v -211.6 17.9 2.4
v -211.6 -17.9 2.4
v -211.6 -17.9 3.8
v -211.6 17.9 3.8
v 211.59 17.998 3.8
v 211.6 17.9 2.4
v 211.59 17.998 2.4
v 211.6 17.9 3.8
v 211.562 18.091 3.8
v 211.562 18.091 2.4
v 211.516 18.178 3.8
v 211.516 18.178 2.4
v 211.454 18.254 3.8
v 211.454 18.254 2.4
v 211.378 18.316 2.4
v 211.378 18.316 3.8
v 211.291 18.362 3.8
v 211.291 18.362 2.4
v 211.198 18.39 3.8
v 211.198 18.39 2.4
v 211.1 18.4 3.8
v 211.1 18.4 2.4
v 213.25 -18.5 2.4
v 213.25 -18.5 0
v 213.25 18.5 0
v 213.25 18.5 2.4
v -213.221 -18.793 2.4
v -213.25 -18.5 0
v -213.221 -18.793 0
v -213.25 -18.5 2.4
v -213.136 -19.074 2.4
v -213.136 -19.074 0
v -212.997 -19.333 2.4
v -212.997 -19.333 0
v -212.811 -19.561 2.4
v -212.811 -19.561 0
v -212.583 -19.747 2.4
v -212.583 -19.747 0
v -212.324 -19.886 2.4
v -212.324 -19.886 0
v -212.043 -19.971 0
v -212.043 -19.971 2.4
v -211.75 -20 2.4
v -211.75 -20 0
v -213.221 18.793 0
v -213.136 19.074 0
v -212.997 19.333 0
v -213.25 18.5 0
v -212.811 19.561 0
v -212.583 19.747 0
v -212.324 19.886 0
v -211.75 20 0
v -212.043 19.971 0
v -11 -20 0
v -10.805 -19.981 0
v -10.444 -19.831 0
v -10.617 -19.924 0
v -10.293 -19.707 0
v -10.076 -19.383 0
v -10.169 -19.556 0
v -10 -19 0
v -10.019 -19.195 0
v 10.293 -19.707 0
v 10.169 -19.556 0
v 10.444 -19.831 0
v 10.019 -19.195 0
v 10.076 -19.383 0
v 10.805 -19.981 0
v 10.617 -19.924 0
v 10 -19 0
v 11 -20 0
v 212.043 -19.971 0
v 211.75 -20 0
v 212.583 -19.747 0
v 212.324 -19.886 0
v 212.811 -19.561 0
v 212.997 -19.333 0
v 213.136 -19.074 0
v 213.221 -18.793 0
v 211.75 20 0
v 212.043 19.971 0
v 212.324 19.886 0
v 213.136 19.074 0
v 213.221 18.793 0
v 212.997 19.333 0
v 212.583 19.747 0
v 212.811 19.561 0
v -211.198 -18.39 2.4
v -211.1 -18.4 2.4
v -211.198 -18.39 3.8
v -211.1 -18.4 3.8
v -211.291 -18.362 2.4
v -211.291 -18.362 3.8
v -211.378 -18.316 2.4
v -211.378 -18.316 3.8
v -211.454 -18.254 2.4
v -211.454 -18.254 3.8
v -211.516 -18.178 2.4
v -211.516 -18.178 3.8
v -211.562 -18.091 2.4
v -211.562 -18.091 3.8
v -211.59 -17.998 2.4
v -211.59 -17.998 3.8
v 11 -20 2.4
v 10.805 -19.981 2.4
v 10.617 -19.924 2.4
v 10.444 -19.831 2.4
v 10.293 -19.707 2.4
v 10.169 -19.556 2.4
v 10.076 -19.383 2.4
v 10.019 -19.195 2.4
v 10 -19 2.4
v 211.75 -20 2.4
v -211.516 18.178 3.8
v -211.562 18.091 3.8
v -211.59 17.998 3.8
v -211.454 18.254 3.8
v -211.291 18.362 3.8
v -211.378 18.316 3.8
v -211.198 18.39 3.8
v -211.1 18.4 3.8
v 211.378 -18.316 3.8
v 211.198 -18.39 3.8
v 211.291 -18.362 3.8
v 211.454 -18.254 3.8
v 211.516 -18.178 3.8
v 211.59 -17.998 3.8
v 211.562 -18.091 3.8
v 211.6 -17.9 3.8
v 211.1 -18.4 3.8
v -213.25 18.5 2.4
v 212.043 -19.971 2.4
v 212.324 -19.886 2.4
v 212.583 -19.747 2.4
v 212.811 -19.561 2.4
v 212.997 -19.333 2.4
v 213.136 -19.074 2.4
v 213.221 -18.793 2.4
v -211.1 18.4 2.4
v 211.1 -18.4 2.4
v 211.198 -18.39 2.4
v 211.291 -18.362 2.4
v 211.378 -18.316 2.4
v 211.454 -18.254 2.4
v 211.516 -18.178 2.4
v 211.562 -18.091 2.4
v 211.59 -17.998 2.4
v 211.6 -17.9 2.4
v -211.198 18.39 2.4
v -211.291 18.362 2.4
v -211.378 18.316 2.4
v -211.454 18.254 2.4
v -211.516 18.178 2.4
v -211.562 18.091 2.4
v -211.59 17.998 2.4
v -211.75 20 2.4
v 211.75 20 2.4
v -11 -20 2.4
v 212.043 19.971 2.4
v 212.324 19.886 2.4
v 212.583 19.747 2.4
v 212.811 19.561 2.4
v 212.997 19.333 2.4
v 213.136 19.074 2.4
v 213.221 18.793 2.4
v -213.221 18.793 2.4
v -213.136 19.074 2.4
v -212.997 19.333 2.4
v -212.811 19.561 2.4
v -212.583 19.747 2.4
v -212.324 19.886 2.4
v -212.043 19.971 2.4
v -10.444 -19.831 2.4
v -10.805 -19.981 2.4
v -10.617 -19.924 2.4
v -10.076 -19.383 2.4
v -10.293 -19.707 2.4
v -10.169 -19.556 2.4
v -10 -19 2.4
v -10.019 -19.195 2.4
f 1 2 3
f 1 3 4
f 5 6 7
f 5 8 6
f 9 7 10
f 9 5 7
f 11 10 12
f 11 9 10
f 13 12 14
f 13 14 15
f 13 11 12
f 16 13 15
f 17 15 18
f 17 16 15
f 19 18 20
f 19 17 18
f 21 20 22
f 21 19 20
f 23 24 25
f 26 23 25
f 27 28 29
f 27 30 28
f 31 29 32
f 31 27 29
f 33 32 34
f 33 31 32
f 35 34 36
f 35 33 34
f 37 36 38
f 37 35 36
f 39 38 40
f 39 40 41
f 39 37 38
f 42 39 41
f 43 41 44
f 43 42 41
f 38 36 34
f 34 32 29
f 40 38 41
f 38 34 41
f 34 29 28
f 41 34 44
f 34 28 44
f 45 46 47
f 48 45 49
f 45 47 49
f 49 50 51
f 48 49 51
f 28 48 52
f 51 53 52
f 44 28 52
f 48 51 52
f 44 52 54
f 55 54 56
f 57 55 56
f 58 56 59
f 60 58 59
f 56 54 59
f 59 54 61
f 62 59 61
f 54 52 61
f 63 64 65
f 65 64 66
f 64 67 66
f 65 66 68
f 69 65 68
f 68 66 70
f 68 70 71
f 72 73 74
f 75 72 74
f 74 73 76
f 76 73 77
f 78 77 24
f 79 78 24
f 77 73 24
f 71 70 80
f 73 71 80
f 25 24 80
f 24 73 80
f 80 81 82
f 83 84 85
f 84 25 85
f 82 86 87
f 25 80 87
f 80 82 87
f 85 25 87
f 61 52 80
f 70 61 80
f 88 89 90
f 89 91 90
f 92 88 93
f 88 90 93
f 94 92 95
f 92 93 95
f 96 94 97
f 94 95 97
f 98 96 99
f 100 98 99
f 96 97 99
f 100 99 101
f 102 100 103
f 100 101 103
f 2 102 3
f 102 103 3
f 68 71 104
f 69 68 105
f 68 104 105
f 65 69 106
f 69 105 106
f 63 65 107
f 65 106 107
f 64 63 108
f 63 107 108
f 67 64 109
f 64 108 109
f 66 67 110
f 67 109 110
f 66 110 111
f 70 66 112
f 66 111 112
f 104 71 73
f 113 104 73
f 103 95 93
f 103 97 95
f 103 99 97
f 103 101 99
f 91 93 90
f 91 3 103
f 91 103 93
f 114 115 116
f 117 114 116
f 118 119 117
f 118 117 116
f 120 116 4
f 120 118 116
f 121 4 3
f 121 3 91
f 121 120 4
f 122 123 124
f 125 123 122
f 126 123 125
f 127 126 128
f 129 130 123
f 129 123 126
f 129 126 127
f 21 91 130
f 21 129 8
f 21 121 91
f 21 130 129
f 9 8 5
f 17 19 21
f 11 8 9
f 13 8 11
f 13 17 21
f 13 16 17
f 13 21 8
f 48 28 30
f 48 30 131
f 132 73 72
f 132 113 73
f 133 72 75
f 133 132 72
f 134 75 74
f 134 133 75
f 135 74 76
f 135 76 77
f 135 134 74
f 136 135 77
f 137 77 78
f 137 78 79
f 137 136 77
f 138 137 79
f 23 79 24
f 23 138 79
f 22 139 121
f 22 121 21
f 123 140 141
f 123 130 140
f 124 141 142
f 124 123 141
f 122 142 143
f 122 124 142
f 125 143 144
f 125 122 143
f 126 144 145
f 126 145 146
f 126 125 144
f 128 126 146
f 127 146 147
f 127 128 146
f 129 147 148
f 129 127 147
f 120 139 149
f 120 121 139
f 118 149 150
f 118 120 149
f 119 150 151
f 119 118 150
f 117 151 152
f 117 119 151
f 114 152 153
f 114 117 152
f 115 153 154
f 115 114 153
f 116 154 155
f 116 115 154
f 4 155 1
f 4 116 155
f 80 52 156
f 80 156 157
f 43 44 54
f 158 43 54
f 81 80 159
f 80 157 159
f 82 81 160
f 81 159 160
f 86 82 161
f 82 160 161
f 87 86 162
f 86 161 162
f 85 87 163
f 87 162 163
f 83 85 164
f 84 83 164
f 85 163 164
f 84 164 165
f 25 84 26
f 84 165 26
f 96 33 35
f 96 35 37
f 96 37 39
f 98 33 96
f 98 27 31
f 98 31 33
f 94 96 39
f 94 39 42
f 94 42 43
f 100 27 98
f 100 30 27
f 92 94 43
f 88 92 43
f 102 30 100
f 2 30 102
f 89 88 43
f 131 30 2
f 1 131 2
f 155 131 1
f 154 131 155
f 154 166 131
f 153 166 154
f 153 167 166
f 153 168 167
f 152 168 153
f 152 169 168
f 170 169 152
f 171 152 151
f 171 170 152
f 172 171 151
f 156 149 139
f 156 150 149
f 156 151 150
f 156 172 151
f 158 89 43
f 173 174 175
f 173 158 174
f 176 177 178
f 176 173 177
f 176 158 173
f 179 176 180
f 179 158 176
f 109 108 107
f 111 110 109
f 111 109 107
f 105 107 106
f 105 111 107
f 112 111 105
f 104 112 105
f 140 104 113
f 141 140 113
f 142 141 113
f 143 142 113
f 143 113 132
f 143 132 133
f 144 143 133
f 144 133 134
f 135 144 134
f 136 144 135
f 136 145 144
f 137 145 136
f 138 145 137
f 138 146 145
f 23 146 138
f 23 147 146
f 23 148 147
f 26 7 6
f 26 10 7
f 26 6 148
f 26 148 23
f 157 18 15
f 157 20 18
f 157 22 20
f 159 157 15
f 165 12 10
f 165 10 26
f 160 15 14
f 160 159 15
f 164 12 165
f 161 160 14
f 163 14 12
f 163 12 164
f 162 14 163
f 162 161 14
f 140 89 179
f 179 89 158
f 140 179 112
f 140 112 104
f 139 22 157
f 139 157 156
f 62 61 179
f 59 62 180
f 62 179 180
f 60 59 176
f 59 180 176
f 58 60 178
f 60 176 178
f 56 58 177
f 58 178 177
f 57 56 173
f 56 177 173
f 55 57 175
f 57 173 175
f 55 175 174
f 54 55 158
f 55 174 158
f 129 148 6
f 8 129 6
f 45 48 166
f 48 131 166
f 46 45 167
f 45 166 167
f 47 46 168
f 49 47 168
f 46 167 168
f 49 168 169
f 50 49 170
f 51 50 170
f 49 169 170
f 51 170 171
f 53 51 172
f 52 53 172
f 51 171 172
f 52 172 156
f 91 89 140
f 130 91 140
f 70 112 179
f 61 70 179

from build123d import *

# Parameters (mm, degrees)
SKICA1_W                 = 426.5
SKICA1_H                 = 40
P_IDAT_VYSUNUT_M1_DEPTH  = 2.4
SKICA2_W                 = 423.2
SKICA2_H                 = 36.8
P_IDAT_VYSUNUT_M2_DEPTH  = 1.4
ZAOBLIT1_R               = 1.5
ZAOBLIT2_R               = 0.5
ODEBRAT_VYSUNUT_M1_DEPTH = 215.199258869


with BuildPart() as part:
    # Skica1 → Přidat vysunutím1 (new body)
    with BuildSketch(Plane.XY):
        Rectangle(SKICA1_W, SKICA1_H)
    extrude(amount=P_IDAT_VYSUNUT_M1_DEPTH)

    # Skica2 → Přidat vysunutím2 (add)
    with BuildSketch(Plane.XY.offset(2.4)):
        Rectangle(SKICA2_W, SKICA2_H)
    extrude(amount=P_IDAT_VYSUNUT_M2_DEPTH)

    # Zaoblit1
    zaoblit1_edges = [part.edges().sort_by_distance(p)[0] for p in [
        (-213.25, 20, 1.2),
        (213.25, 20, 1.2),
        (213.25, -20, 1.2),
        (-213.25, -20, 1.2),
    ]]
    fillet(zaoblit1_edges, radius=ZAOBLIT1_R)

    # Zaoblit2
    zaoblit2_edges = [part.edges().sort_by_distance(p)[0] for p in [
        (211.6, -18.4, 3.1),
        (211.6, 18.4, 3.1),
        (-211.6, 18.4, 3.1),
        (-211.6, -18.4, 3.1),
    ]]
    fillet(zaoblit2_edges, radius=ZAOBLIT2_R)

    # Skica3 → Odebrat vysunutím1 (cut, through all)
    with BuildSketch(Plane.XY.offset(2.4)):
        with BuildLine():
            Line((0, -19), (-10, -19))
            ThreePointArc((-10, -19), (-10.292893219, -19.707106781), (-11, -20))
            Line((-11, -20), (-11, -20.116946074))
            Line((-11, -20.116946074), (11, -20.116946074))
            Line((11, -20.116946074), (11, -20))
            ThreePointArc((11, -20), (10.292893219, -19.707106781), (10, -19))
            Line((10, -19), (0, -19))
        make_face()
    extrude(amount=-ODEBRAT_VYSUNUT_M1_DEPTH, mode=Mode.SUBTRACT)


solid = part.part
